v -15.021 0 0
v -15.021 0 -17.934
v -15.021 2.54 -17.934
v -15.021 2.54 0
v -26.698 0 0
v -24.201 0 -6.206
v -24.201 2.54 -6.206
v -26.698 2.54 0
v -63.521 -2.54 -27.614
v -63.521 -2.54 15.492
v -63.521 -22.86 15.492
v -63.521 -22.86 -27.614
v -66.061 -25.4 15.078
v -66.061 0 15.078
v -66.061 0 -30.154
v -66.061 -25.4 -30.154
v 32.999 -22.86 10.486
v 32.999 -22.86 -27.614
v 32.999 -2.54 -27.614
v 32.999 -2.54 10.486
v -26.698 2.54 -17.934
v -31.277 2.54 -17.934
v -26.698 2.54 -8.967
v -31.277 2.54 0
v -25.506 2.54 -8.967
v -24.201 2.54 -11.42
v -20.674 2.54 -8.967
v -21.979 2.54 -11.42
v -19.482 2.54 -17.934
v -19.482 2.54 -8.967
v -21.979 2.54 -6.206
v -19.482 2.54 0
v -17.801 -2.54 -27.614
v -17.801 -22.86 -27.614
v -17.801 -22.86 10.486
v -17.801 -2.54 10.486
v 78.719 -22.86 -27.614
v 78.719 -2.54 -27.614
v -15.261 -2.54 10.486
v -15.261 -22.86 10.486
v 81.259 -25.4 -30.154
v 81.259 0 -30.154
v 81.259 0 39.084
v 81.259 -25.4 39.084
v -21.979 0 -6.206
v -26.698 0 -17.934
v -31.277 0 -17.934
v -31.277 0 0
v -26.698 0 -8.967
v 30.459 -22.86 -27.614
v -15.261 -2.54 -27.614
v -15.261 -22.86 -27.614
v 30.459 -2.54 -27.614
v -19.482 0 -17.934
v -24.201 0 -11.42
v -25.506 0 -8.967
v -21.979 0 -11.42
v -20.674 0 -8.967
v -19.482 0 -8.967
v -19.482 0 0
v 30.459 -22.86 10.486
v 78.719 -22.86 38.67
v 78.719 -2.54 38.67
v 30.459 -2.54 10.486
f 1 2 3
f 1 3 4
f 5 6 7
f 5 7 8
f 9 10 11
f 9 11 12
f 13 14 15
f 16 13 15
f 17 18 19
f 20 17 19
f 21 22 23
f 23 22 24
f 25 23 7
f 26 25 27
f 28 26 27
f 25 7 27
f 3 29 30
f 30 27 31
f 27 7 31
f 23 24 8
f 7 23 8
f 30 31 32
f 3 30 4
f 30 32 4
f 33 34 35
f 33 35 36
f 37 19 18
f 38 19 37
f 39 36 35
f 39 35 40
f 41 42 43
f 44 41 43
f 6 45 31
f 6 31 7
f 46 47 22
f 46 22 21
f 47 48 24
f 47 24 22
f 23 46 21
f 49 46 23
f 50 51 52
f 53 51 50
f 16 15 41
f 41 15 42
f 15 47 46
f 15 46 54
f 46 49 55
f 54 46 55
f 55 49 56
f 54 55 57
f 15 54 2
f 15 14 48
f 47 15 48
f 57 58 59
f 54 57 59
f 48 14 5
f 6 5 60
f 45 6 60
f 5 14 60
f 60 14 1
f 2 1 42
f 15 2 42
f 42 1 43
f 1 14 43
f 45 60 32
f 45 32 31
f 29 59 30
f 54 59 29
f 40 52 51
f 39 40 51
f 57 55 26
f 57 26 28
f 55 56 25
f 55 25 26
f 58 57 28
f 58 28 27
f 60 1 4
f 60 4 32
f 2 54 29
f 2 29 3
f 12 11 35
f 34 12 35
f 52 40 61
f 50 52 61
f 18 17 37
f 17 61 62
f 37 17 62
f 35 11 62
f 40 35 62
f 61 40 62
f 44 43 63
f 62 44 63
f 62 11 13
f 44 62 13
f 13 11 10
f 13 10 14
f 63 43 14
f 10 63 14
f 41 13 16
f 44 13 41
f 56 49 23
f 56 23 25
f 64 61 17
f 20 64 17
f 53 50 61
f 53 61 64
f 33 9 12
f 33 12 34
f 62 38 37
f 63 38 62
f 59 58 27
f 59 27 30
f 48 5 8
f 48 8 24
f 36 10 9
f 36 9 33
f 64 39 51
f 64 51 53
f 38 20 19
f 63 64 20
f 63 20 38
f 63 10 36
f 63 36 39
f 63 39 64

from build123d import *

# Parameters (mm, degrees)
F1_DEPTH = 25.4
F2_T     = -2.54
F3_W     = 2.54
F3_H     = 20.32
F4_DEPTH = 38.1
F6_DEPTH = 2.54


with BuildPart() as f1:
    # F0 (on Front) → F1 (new body)
    with BuildSketch(Plane.XZ):
        Polygon((-66.060728, 15.077978), (-66.060728, -30.15408), (81.259272, -30.15408), (81.259272, 39.08381), align=None)
    extrude(amount=F1_DEPTH)

    # F2
    f2_openings = [f1.faces().sort_by_distance(p)[0] for p in [
        (7.599272, -12.7, 27.080894),
    ]]
    offset(amount=F2_T, openings=f2_openings)

    # F3 (on face) → F4 (join)
    with BuildSketch(Plane.XY.offset(-27.61408)):
        with Locations((31.729272, -12.7)):
            Rectangle(F3_W, F3_H)
        with Locations((-16.530728, -12.7)):
            Rectangle(F3_W, F3_H)
    extrude(amount=F4_DEPTH)

    # F5 (on Front) → F6 (join)
    with BuildSketch(Plane.XZ):
        Polygon((-26.697874, 0), (-31.276897, 0), (-31.276897, -17.934263), (-26.697874, -17.934263), (-26.697874, -8.967131), (-25.506107, -8.967131), (-24.200872, -11.420006), (-23.090161, -11.420006), (-21.97945, -11.420006), (-20.674216, -8.967131), (-19.482449, -8.967131), (-19.482449, -17.934263), (-15.020955, -17.934263), (-15.020955, 0), (-19.482449, 0), (-21.97945, -6.206409), (-24.200872, -6.206409), align=None)
    extrude(amount=-F6_DEPTH)


solid = f1.part
